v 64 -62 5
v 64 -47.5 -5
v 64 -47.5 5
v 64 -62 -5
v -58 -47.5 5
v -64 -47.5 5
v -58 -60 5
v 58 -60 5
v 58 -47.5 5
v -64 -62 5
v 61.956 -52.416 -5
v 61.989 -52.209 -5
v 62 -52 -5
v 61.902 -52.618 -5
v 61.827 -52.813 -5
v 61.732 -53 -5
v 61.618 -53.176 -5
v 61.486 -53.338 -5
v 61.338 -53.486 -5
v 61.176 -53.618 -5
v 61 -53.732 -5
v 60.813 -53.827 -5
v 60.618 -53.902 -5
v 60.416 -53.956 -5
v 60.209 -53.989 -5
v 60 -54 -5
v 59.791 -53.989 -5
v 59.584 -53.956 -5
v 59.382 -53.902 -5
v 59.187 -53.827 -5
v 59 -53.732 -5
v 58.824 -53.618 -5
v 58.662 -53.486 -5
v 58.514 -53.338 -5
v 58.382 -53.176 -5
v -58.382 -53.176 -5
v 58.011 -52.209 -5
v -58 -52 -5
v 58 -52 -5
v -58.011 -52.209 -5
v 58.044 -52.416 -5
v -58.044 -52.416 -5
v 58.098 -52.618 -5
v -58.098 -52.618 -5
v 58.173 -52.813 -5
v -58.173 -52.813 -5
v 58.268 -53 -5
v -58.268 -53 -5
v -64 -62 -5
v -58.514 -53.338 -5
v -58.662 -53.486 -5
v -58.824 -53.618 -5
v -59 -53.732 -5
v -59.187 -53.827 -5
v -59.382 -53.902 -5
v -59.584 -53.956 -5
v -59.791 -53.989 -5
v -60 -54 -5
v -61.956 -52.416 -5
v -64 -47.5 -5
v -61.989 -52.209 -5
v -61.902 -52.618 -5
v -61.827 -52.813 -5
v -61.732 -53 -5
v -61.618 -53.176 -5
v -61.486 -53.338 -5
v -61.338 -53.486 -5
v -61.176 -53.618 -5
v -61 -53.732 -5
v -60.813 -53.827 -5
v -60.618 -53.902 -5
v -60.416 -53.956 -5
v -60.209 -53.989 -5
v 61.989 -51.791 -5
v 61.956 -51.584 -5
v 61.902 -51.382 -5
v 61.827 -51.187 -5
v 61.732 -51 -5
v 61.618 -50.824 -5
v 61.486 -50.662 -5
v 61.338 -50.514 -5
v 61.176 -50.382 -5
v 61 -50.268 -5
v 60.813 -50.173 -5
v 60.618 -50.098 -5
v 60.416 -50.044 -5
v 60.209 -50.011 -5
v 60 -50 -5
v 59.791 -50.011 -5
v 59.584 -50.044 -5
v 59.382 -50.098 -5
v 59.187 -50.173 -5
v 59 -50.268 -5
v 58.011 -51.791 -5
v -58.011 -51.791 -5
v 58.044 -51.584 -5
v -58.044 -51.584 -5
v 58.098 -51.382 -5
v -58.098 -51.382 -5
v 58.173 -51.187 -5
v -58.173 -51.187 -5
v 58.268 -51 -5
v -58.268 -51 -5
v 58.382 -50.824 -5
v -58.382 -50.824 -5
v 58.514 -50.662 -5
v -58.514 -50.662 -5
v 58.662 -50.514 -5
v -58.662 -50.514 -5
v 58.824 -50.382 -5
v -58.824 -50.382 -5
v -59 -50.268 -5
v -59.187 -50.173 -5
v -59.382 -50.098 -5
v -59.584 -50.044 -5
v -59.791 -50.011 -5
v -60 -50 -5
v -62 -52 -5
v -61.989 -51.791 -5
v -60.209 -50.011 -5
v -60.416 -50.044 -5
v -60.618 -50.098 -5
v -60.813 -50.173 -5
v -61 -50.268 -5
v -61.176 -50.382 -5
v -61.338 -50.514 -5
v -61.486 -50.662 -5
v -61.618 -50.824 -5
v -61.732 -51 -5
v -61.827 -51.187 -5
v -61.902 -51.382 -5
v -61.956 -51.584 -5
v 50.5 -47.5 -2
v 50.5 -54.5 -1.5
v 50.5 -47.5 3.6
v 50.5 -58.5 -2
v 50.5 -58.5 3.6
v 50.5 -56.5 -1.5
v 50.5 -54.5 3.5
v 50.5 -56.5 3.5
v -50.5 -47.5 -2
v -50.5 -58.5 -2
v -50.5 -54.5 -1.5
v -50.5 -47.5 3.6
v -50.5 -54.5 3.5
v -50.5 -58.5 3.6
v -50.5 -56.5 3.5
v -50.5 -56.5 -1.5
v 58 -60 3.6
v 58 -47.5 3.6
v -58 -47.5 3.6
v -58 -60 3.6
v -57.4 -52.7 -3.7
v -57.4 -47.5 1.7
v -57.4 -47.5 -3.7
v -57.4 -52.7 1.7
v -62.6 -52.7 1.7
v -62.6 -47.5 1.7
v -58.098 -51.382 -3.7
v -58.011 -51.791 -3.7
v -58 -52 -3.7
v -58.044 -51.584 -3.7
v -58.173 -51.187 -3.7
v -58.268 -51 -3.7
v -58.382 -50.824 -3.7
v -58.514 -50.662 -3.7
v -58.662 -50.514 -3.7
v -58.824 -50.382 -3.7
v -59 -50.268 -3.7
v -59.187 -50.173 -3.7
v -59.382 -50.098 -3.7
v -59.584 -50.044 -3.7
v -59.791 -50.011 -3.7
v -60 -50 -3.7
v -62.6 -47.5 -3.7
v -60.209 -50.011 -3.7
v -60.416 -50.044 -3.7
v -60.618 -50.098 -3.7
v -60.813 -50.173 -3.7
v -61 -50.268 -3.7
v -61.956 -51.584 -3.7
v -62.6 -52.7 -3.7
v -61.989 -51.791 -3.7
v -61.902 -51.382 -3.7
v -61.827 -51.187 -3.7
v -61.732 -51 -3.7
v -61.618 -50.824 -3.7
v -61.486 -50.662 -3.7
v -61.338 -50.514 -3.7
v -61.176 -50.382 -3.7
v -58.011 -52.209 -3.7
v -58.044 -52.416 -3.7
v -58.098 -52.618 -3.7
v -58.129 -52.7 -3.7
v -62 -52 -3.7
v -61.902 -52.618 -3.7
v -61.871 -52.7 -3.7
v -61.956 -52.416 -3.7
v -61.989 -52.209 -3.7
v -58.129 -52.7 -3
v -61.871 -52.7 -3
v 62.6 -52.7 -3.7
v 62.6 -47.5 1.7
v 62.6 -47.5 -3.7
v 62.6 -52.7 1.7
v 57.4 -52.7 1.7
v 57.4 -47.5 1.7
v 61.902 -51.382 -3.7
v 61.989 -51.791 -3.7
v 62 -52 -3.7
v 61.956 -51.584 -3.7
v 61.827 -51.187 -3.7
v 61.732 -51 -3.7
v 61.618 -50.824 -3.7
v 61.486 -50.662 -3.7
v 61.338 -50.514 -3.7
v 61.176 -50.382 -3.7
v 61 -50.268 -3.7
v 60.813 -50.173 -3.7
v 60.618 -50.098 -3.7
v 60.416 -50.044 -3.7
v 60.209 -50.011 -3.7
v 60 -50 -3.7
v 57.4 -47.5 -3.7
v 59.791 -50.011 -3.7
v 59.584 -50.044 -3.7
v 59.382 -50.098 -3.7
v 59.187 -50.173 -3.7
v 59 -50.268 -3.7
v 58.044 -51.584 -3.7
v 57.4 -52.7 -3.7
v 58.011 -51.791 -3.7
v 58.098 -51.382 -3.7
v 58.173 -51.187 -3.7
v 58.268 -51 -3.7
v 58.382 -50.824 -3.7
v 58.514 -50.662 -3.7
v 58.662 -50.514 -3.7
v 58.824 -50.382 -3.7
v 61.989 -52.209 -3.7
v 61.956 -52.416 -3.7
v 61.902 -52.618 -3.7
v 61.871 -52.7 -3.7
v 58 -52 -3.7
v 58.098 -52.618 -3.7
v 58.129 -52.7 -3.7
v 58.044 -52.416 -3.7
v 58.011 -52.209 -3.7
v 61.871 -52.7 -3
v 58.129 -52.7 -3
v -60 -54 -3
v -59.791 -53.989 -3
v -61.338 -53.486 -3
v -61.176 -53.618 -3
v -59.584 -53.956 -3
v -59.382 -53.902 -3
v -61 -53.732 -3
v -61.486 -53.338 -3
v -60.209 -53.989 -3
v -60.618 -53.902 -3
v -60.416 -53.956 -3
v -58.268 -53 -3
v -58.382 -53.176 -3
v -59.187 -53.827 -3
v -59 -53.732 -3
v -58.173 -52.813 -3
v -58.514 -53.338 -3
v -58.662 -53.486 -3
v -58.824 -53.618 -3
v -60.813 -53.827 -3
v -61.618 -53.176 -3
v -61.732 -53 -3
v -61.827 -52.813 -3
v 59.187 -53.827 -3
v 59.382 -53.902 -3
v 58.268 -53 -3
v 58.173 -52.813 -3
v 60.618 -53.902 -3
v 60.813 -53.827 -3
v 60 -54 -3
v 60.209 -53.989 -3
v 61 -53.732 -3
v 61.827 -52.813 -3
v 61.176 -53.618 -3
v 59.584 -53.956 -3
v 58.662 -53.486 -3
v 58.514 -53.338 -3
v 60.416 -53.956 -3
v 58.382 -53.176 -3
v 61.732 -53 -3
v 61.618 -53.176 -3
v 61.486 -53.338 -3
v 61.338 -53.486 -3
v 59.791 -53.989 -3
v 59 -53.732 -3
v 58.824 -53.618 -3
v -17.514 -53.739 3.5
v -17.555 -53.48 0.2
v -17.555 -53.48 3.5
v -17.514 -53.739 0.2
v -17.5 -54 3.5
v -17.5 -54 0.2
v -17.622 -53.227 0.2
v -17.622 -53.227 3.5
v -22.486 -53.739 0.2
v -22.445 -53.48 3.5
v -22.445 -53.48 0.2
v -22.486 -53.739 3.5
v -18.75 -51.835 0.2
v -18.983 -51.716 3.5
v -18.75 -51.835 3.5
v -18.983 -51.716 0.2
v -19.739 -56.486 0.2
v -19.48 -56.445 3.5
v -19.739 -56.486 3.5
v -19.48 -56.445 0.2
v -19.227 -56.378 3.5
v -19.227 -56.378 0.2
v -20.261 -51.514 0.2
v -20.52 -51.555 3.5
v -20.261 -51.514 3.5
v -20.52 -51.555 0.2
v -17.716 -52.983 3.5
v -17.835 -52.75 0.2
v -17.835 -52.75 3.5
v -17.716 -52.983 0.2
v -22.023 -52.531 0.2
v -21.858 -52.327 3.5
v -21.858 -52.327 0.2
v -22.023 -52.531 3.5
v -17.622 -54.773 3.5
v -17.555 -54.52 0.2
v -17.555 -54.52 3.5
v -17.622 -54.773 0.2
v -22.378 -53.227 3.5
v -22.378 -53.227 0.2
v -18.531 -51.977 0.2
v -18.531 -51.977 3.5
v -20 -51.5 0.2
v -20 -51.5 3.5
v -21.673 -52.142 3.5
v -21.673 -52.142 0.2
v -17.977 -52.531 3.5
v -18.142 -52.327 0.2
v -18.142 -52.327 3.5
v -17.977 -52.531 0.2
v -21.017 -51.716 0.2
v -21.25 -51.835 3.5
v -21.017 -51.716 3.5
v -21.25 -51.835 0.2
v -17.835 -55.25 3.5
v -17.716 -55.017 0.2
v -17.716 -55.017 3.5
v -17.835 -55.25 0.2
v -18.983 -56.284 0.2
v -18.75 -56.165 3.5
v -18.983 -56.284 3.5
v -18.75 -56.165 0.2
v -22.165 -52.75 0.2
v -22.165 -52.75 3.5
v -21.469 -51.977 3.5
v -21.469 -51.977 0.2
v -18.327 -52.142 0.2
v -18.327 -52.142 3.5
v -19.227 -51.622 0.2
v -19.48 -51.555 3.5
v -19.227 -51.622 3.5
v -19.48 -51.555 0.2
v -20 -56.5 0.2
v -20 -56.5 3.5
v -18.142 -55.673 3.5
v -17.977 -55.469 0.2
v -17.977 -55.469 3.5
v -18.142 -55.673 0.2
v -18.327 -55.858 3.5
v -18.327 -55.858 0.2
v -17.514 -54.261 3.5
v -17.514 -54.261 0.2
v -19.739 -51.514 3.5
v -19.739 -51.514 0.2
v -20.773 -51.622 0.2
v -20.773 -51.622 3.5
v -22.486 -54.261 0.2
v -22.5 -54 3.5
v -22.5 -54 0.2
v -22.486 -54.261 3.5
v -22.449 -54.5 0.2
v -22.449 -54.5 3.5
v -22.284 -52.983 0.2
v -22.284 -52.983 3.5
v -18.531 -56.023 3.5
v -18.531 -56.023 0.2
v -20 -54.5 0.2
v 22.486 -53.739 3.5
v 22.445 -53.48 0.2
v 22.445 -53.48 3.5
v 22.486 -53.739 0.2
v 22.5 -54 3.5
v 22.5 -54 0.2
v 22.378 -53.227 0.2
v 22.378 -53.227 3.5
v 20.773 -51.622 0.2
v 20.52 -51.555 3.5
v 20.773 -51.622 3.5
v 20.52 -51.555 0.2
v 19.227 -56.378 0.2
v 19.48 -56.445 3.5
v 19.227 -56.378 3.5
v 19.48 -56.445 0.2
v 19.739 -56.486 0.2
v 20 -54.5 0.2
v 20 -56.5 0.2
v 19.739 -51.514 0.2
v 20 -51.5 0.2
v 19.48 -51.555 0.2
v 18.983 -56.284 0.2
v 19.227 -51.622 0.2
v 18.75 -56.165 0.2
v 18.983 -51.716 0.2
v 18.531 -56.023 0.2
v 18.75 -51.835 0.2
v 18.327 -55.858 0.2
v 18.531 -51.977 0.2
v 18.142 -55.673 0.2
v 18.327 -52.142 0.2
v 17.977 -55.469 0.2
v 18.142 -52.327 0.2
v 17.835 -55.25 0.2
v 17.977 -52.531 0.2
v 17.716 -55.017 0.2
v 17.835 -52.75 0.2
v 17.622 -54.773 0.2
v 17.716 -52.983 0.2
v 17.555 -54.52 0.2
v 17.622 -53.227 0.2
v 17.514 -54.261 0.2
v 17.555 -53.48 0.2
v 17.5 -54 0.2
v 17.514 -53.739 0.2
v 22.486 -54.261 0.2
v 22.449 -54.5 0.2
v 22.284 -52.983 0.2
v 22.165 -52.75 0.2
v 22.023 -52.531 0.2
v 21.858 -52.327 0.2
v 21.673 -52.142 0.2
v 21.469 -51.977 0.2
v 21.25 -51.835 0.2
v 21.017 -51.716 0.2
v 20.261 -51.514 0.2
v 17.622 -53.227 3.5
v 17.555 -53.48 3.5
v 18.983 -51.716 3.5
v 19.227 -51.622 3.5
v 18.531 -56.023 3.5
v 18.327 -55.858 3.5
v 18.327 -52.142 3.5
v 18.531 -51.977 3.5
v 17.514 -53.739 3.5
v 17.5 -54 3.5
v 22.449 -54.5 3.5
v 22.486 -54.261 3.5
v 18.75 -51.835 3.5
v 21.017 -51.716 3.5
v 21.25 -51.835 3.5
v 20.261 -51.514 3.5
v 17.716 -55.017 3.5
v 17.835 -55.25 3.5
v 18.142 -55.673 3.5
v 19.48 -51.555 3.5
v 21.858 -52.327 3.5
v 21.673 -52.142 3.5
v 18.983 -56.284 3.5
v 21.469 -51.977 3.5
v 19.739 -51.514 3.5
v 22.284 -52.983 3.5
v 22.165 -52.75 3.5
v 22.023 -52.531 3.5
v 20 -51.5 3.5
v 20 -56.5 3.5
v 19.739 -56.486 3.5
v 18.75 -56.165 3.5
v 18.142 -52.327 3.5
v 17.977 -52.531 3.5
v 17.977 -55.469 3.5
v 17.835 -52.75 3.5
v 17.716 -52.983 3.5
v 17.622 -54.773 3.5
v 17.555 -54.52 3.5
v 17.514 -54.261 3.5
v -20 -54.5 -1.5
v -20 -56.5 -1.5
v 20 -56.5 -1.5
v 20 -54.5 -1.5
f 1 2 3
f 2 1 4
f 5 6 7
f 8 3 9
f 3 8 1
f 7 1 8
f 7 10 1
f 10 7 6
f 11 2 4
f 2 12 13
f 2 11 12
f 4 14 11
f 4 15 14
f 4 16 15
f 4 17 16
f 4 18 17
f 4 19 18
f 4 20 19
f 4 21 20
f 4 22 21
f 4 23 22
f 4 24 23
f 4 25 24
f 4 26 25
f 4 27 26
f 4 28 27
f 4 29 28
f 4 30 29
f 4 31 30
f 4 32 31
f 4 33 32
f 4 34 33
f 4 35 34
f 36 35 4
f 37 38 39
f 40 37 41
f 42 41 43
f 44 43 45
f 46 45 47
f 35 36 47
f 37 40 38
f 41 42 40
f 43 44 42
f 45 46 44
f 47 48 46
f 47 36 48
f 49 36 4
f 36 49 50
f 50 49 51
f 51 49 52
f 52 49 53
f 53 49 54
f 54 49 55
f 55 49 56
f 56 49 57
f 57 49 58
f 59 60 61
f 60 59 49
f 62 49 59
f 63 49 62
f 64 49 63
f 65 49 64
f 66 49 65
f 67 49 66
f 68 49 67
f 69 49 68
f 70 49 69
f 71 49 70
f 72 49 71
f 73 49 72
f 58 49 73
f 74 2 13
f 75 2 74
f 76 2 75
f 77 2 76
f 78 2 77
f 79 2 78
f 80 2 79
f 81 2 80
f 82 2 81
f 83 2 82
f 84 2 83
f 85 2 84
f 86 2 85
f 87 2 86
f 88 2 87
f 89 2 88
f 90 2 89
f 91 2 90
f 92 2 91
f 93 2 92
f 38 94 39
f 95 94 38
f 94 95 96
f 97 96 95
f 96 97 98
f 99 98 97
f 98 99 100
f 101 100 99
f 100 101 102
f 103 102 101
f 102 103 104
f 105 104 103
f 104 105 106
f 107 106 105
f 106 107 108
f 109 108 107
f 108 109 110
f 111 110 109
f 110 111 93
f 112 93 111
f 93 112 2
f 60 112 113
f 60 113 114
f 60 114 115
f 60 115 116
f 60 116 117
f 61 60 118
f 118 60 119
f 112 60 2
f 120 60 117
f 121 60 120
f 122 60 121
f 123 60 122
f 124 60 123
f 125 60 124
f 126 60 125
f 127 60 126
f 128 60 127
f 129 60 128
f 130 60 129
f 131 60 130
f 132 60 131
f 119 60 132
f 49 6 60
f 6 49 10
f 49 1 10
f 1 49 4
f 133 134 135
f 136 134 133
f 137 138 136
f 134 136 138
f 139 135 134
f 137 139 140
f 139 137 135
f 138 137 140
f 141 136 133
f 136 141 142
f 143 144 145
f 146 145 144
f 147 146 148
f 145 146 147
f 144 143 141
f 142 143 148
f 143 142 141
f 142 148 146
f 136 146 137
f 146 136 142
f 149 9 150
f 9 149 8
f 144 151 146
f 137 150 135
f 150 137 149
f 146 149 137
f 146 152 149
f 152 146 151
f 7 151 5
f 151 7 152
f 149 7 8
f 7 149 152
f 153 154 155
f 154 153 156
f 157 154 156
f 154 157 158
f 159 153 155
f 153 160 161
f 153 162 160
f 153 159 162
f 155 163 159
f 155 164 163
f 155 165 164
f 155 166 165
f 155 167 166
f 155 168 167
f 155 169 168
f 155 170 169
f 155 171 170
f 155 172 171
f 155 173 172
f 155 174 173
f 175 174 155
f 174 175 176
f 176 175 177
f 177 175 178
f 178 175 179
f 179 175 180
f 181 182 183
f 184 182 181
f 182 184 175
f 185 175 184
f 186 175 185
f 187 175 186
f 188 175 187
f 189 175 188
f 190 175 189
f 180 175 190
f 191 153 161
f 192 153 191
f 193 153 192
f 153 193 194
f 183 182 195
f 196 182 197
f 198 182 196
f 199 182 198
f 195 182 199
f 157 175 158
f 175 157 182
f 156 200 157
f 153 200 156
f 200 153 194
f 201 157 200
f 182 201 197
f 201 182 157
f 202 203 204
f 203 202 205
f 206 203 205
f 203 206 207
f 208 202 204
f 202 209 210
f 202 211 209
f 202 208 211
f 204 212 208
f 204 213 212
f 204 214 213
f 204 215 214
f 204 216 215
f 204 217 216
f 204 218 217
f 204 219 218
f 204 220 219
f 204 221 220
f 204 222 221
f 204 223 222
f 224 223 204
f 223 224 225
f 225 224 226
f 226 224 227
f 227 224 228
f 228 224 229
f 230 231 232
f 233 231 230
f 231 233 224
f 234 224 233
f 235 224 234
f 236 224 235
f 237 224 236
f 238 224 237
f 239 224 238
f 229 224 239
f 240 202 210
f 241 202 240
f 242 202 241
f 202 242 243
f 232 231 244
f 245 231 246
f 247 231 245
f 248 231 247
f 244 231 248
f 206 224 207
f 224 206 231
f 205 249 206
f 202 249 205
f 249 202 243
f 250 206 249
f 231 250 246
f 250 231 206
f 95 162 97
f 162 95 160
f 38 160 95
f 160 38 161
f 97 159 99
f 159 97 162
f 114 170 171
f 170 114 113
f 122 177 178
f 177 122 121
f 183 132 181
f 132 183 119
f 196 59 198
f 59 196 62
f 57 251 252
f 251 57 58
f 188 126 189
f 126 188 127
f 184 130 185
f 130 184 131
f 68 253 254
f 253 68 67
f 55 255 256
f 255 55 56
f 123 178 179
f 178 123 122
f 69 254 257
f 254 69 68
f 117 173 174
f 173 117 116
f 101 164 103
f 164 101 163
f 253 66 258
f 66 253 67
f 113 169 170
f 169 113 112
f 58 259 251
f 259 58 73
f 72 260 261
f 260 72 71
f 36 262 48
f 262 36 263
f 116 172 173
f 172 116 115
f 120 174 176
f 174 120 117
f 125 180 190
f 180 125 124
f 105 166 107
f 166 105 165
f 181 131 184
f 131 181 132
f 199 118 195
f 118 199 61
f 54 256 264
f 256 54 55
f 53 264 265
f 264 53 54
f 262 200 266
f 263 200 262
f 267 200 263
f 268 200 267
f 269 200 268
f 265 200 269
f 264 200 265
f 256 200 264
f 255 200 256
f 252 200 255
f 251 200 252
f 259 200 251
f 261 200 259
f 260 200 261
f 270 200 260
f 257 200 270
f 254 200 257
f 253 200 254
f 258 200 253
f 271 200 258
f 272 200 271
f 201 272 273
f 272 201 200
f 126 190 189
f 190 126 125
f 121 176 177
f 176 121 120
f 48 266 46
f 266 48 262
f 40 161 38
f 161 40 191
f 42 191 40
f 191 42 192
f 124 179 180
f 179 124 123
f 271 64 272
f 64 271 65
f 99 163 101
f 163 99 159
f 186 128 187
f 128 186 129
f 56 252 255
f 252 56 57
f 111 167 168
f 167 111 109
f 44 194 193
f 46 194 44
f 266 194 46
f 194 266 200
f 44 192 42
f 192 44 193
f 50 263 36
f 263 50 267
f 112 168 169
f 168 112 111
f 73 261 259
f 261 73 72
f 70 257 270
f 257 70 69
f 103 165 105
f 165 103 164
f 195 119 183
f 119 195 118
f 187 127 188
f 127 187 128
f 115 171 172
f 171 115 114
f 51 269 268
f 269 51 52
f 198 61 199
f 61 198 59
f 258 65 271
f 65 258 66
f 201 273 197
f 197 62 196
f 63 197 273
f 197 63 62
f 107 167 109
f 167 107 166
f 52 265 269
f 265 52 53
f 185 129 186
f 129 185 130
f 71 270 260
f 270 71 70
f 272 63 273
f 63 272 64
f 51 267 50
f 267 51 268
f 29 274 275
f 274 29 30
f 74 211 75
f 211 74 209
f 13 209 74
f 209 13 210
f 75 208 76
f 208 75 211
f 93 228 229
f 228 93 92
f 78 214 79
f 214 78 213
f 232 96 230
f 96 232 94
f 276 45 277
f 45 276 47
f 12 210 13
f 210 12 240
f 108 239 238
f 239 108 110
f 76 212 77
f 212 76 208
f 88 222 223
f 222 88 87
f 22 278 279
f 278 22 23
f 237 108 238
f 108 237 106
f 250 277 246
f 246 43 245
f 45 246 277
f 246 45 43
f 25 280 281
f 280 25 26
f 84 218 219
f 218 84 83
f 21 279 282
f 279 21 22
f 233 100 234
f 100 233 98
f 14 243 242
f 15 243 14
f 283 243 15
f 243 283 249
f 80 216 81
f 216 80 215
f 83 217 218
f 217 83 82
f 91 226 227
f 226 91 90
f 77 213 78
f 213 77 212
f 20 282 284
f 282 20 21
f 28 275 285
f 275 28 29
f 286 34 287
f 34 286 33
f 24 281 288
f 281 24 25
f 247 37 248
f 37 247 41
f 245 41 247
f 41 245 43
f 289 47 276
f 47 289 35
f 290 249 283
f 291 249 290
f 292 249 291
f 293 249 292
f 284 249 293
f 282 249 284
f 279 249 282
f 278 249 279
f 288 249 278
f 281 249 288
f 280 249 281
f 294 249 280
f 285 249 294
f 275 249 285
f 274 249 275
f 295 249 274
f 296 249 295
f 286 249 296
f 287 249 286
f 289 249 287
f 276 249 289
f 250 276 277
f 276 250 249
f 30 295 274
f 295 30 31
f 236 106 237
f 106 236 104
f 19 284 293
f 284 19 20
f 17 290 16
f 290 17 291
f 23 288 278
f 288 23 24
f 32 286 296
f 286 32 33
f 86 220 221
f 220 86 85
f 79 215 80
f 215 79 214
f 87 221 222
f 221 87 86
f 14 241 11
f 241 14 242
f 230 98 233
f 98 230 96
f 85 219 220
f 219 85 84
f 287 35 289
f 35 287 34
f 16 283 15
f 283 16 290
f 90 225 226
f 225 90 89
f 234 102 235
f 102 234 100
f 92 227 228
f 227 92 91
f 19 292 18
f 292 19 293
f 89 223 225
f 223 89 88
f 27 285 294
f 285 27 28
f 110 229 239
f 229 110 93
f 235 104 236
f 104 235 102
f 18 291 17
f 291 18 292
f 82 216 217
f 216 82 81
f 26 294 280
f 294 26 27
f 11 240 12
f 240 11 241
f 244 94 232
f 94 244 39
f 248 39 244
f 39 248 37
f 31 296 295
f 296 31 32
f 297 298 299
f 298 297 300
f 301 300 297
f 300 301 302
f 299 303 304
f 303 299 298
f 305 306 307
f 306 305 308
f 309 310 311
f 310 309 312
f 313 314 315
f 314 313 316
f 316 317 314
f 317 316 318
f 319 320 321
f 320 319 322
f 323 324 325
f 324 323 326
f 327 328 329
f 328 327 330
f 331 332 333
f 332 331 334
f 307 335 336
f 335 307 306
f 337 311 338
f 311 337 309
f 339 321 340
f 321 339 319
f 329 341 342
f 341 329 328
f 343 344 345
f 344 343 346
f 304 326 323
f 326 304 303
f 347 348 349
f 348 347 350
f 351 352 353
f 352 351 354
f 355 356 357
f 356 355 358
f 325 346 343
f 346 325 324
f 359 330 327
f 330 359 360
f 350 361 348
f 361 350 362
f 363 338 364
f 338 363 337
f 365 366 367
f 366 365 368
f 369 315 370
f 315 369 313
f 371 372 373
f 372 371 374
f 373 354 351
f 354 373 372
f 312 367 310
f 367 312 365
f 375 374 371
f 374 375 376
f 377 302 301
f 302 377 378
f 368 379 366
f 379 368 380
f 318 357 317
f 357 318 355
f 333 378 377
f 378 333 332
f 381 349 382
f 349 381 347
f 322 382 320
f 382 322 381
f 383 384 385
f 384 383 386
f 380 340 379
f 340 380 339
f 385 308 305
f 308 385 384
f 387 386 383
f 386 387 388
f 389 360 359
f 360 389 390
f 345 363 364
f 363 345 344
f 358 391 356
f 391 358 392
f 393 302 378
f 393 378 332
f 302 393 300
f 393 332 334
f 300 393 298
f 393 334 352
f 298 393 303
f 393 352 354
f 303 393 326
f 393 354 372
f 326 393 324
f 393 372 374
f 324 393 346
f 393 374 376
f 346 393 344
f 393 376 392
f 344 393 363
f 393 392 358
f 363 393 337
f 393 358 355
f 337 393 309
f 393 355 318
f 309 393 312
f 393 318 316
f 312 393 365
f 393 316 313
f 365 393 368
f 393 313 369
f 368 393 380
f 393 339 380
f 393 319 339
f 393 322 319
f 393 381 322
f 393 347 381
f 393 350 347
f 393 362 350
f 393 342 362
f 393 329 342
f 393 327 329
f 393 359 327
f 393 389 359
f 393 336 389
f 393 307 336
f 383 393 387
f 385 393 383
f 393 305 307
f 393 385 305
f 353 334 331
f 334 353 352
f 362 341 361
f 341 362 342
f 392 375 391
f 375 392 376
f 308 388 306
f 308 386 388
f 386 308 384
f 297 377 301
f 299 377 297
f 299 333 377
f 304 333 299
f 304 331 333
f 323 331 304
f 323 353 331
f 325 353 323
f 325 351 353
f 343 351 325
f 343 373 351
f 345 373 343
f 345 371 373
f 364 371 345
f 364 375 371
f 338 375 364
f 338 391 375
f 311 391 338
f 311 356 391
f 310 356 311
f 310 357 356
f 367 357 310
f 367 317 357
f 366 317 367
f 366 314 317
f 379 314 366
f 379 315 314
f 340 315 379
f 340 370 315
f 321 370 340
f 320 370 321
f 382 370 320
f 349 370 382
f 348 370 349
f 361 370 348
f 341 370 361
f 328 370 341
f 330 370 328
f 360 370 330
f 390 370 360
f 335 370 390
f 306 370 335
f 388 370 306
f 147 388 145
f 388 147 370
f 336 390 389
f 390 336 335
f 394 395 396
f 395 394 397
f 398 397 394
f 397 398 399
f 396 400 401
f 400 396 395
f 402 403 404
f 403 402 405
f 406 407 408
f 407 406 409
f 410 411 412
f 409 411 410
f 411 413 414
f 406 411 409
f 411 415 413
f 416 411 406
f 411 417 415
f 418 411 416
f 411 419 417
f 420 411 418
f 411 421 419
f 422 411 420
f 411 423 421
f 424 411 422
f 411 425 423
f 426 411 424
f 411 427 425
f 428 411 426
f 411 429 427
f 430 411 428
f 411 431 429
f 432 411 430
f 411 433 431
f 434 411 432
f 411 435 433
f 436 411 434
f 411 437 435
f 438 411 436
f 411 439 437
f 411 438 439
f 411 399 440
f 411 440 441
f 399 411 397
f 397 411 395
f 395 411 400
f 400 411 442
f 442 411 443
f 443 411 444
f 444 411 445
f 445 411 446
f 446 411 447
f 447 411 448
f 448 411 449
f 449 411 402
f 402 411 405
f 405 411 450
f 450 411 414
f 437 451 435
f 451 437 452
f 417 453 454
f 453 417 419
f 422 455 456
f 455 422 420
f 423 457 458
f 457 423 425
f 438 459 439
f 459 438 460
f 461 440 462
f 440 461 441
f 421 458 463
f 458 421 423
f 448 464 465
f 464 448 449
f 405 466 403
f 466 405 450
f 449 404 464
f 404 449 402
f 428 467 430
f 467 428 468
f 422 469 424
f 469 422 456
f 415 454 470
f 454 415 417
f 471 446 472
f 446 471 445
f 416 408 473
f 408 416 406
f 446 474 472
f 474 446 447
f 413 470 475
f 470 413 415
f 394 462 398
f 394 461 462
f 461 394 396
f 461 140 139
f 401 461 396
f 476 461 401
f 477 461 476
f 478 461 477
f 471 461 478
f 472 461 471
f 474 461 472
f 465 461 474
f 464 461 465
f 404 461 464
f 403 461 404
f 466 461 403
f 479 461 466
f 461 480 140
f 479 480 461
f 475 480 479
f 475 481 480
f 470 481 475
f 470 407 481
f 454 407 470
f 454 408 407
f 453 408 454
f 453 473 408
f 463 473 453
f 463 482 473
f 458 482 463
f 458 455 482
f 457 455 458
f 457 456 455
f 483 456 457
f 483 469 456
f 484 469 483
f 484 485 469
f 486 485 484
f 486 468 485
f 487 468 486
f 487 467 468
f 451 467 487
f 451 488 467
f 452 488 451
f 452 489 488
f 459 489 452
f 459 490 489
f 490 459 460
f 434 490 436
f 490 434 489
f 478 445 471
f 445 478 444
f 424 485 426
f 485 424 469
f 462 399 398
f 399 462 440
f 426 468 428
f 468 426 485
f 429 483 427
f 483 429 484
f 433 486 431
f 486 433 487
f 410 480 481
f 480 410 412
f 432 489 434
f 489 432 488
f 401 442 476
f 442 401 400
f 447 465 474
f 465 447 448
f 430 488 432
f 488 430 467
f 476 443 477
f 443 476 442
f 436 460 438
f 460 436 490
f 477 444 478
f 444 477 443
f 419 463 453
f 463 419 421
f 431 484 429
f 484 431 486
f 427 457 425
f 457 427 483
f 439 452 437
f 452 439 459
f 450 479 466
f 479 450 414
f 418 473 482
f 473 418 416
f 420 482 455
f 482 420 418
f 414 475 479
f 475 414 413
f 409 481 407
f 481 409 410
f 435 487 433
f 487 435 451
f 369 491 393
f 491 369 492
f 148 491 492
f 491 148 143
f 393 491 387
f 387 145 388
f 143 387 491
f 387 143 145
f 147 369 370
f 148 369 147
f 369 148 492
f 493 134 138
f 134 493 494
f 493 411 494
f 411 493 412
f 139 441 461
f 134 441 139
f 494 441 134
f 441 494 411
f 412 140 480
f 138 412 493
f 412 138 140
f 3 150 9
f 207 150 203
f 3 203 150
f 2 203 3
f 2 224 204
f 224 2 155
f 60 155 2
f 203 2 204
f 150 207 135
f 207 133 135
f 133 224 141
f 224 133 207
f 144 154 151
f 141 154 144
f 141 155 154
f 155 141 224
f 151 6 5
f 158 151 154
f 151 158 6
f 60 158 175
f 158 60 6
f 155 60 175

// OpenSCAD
//multi-functional plate holder
$fn=80;

plate_holder(); //glass strip plus 3 mm silicone mat
//translate([0, -2, 7.5]) cover_development();  //plate cover during development

x=128;
y=124;
h=10;
platte_x=101;
platte_x_50=104;
platte_y=101;
platte_y_50=51;

module plate_holder() {   //glass strip+3 mm silicone mat
    color( "Gray", 1.0 ) {
    difference() {
    union() {
        main_body();            
        //position burling for aluminum plate
        translate([-50, -1, -3]) cylinder(r=1.5, h=3, $fn=60);
        //stop plate
        translate([-57, 48.5, -4]) cube([platte_x+13, 1, 5.4]);
        //pressure springs
        translate([-20, -54, 0.2]) cylinder(r=2.5, h=3.3, $fn=60);
        translate([20, -54, 0.2]) cylinder(r=2.5, h=3.3, $fn=60);
        translate([-platte_x/2, -56.5, -1.5]) cube([30.5, 2, 5]);
        translate([platte_x/2-30.5, -56.5, -1.5]) cube([30.5, 2, 5]);
    }
    //lowering for glass+silicone mat: h=3,9 mm
    translate([-57, 49.5, -2]) cube([platte_x+13, 9, 10]);
    translate([-platte_x/2, 48.5, 1.4]) cube([platte_x, 2, 10]);
    //cut to retain front or back part: select
        //front part
    //translate([-65, -62, -5]) cube([130, 14.5, 10]);
        //back part
    translate([-65, -47.5, -5]) cube([130, 110, 10]);
}
}
//HPTLC plate for testing
//#translate([-platte_x/2, -platte_y/2-2, 0]) cube([platte_x, platte_y, 1.2]);

//aluminim plate for testing
//translate([-platte_x/2, -platte_y/2+3, -2]) cube([platte_x, platte_y-5, 2]); 

//glas strip+silicone mat for testing
//translate([-57, 48.5, -2.5]) cube([114, 10, 3.9]);
}

module main_body() {
    color( "Gray", 1.0 ) {
    difference() {
        //main body
        cube([x, y, h], center=true);
        //cutout plate
        translate([0, -2, 2]) cube([platte_x, platte_y, h-2], center=true);
        //pressure springs cutout
        translate([-platte_x/2, -(platte_y/2+8), -2]) cube([platte_x, 10, 10]);
        //lowering heating mats
        translate([0, -7, 0]) cube([platte_x, 66, 5.0], center=true);
        //cutout cover plate
        translate([0, 0, 4.3]) cube([platte_x+15, platte_y+15+4, 1.4], center=true);
    //chambers for magnets
        translate([60, 23+15, -2]) cube([8, 8, 3.1], center=true);
        translate([60, 23-16, -2]) cube([8, 8, 3.1], center=true);
        translate([-60, 23+15, -2]) cube([8, 8, 3.1], center=true);
        translate([-60, 23-16, -2]) cube([8, 8, 3.1], center=true);
    //positon holes: M4 screw
        distance=110;
        rand=(x-distance)/2;
        translate([x/2-rand, 23, -5]) cylinder(r=3.75, h=5);
        mirror([1,0,0]) translate([x/2-rand, 23, -5]) cylinder(r=3.75, h=5);
        //heating mat contacts
        translate([23, -6, -2]) cube([55, 20, 5], center =true);
        //heating mat cables
        translate([55, -6, -2]) cube([30, 12, 4], center=true);
        //thermistor
        translate([20, -38, -2]) cube([61, 4, 4], center=true);
        //thermistor cables
        translate([58, -38, -3]) cube([15, 2*2.7, 2.7], center=true);
        //slit for glass strip
        translate([-55, -46.5, -2]) cube([110, 1.6, 10]);
       //magnet cubes back part
        translate([-60, -50.1, -1]) cube([5.2, 5.2, 5.4], center=true);
        translate([60, -50.1, -1]) cube([5.2, 5.2, 5.4], center=true);
        //magnet cubes front part
        translate([-60, -45.1, -1]) cube([5.2, 5.2, 5.4], center=true);
        translate([60, -45.1, -1]) cube([5.2, 5.2, 5.4], center=true);
        //holes under magnet cubes
        translate([-60, -52, -6]) cylinder(r=2, h=3, $fn=60);
        translate([60, -52, -6]) cylinder(r=2, h=3, $fn=60);
        translate([-60, -42, -6]) cylinder(r=2, h=3, $fn=60);
        translate([60, -42, -6]) cylinder(r=2, h=3, $fn=60);
        }  
    }        
}

module cover_development() {
    color( "Gray", 1.0 ) {
    difference() {
    cube([platte_x+14.8, platte_y+14.8+8, 8], center=true);
    translate([0, 0, 3.5]) cube([platte_x, platte_y, 1], center=true);
    translate([0, 0, 0]) cube([96, 96, 10], center=true);
    translate([0, 0, -3]) cube([platte_x, platte_y, 8], center=true);
    //cut back
translate([-65, -62, -5]) cube([130, 16.5, 10]);
    //slit for glass strip
translate([-55, -44.5, -4]) cube([110, 1.6, 8]);
    translate([-50.5, -50, -5]) cube([101, 6, 10]);    
    }
//glass plate cover for testing
    //translate([0, 4, 3.5]) cube([platte_x, platte_y-7, 1], center=true);
//glass strip for testing
    //translate([-55, -44.5, -6]) cube([110, 1.6, 12]);    
}
}
